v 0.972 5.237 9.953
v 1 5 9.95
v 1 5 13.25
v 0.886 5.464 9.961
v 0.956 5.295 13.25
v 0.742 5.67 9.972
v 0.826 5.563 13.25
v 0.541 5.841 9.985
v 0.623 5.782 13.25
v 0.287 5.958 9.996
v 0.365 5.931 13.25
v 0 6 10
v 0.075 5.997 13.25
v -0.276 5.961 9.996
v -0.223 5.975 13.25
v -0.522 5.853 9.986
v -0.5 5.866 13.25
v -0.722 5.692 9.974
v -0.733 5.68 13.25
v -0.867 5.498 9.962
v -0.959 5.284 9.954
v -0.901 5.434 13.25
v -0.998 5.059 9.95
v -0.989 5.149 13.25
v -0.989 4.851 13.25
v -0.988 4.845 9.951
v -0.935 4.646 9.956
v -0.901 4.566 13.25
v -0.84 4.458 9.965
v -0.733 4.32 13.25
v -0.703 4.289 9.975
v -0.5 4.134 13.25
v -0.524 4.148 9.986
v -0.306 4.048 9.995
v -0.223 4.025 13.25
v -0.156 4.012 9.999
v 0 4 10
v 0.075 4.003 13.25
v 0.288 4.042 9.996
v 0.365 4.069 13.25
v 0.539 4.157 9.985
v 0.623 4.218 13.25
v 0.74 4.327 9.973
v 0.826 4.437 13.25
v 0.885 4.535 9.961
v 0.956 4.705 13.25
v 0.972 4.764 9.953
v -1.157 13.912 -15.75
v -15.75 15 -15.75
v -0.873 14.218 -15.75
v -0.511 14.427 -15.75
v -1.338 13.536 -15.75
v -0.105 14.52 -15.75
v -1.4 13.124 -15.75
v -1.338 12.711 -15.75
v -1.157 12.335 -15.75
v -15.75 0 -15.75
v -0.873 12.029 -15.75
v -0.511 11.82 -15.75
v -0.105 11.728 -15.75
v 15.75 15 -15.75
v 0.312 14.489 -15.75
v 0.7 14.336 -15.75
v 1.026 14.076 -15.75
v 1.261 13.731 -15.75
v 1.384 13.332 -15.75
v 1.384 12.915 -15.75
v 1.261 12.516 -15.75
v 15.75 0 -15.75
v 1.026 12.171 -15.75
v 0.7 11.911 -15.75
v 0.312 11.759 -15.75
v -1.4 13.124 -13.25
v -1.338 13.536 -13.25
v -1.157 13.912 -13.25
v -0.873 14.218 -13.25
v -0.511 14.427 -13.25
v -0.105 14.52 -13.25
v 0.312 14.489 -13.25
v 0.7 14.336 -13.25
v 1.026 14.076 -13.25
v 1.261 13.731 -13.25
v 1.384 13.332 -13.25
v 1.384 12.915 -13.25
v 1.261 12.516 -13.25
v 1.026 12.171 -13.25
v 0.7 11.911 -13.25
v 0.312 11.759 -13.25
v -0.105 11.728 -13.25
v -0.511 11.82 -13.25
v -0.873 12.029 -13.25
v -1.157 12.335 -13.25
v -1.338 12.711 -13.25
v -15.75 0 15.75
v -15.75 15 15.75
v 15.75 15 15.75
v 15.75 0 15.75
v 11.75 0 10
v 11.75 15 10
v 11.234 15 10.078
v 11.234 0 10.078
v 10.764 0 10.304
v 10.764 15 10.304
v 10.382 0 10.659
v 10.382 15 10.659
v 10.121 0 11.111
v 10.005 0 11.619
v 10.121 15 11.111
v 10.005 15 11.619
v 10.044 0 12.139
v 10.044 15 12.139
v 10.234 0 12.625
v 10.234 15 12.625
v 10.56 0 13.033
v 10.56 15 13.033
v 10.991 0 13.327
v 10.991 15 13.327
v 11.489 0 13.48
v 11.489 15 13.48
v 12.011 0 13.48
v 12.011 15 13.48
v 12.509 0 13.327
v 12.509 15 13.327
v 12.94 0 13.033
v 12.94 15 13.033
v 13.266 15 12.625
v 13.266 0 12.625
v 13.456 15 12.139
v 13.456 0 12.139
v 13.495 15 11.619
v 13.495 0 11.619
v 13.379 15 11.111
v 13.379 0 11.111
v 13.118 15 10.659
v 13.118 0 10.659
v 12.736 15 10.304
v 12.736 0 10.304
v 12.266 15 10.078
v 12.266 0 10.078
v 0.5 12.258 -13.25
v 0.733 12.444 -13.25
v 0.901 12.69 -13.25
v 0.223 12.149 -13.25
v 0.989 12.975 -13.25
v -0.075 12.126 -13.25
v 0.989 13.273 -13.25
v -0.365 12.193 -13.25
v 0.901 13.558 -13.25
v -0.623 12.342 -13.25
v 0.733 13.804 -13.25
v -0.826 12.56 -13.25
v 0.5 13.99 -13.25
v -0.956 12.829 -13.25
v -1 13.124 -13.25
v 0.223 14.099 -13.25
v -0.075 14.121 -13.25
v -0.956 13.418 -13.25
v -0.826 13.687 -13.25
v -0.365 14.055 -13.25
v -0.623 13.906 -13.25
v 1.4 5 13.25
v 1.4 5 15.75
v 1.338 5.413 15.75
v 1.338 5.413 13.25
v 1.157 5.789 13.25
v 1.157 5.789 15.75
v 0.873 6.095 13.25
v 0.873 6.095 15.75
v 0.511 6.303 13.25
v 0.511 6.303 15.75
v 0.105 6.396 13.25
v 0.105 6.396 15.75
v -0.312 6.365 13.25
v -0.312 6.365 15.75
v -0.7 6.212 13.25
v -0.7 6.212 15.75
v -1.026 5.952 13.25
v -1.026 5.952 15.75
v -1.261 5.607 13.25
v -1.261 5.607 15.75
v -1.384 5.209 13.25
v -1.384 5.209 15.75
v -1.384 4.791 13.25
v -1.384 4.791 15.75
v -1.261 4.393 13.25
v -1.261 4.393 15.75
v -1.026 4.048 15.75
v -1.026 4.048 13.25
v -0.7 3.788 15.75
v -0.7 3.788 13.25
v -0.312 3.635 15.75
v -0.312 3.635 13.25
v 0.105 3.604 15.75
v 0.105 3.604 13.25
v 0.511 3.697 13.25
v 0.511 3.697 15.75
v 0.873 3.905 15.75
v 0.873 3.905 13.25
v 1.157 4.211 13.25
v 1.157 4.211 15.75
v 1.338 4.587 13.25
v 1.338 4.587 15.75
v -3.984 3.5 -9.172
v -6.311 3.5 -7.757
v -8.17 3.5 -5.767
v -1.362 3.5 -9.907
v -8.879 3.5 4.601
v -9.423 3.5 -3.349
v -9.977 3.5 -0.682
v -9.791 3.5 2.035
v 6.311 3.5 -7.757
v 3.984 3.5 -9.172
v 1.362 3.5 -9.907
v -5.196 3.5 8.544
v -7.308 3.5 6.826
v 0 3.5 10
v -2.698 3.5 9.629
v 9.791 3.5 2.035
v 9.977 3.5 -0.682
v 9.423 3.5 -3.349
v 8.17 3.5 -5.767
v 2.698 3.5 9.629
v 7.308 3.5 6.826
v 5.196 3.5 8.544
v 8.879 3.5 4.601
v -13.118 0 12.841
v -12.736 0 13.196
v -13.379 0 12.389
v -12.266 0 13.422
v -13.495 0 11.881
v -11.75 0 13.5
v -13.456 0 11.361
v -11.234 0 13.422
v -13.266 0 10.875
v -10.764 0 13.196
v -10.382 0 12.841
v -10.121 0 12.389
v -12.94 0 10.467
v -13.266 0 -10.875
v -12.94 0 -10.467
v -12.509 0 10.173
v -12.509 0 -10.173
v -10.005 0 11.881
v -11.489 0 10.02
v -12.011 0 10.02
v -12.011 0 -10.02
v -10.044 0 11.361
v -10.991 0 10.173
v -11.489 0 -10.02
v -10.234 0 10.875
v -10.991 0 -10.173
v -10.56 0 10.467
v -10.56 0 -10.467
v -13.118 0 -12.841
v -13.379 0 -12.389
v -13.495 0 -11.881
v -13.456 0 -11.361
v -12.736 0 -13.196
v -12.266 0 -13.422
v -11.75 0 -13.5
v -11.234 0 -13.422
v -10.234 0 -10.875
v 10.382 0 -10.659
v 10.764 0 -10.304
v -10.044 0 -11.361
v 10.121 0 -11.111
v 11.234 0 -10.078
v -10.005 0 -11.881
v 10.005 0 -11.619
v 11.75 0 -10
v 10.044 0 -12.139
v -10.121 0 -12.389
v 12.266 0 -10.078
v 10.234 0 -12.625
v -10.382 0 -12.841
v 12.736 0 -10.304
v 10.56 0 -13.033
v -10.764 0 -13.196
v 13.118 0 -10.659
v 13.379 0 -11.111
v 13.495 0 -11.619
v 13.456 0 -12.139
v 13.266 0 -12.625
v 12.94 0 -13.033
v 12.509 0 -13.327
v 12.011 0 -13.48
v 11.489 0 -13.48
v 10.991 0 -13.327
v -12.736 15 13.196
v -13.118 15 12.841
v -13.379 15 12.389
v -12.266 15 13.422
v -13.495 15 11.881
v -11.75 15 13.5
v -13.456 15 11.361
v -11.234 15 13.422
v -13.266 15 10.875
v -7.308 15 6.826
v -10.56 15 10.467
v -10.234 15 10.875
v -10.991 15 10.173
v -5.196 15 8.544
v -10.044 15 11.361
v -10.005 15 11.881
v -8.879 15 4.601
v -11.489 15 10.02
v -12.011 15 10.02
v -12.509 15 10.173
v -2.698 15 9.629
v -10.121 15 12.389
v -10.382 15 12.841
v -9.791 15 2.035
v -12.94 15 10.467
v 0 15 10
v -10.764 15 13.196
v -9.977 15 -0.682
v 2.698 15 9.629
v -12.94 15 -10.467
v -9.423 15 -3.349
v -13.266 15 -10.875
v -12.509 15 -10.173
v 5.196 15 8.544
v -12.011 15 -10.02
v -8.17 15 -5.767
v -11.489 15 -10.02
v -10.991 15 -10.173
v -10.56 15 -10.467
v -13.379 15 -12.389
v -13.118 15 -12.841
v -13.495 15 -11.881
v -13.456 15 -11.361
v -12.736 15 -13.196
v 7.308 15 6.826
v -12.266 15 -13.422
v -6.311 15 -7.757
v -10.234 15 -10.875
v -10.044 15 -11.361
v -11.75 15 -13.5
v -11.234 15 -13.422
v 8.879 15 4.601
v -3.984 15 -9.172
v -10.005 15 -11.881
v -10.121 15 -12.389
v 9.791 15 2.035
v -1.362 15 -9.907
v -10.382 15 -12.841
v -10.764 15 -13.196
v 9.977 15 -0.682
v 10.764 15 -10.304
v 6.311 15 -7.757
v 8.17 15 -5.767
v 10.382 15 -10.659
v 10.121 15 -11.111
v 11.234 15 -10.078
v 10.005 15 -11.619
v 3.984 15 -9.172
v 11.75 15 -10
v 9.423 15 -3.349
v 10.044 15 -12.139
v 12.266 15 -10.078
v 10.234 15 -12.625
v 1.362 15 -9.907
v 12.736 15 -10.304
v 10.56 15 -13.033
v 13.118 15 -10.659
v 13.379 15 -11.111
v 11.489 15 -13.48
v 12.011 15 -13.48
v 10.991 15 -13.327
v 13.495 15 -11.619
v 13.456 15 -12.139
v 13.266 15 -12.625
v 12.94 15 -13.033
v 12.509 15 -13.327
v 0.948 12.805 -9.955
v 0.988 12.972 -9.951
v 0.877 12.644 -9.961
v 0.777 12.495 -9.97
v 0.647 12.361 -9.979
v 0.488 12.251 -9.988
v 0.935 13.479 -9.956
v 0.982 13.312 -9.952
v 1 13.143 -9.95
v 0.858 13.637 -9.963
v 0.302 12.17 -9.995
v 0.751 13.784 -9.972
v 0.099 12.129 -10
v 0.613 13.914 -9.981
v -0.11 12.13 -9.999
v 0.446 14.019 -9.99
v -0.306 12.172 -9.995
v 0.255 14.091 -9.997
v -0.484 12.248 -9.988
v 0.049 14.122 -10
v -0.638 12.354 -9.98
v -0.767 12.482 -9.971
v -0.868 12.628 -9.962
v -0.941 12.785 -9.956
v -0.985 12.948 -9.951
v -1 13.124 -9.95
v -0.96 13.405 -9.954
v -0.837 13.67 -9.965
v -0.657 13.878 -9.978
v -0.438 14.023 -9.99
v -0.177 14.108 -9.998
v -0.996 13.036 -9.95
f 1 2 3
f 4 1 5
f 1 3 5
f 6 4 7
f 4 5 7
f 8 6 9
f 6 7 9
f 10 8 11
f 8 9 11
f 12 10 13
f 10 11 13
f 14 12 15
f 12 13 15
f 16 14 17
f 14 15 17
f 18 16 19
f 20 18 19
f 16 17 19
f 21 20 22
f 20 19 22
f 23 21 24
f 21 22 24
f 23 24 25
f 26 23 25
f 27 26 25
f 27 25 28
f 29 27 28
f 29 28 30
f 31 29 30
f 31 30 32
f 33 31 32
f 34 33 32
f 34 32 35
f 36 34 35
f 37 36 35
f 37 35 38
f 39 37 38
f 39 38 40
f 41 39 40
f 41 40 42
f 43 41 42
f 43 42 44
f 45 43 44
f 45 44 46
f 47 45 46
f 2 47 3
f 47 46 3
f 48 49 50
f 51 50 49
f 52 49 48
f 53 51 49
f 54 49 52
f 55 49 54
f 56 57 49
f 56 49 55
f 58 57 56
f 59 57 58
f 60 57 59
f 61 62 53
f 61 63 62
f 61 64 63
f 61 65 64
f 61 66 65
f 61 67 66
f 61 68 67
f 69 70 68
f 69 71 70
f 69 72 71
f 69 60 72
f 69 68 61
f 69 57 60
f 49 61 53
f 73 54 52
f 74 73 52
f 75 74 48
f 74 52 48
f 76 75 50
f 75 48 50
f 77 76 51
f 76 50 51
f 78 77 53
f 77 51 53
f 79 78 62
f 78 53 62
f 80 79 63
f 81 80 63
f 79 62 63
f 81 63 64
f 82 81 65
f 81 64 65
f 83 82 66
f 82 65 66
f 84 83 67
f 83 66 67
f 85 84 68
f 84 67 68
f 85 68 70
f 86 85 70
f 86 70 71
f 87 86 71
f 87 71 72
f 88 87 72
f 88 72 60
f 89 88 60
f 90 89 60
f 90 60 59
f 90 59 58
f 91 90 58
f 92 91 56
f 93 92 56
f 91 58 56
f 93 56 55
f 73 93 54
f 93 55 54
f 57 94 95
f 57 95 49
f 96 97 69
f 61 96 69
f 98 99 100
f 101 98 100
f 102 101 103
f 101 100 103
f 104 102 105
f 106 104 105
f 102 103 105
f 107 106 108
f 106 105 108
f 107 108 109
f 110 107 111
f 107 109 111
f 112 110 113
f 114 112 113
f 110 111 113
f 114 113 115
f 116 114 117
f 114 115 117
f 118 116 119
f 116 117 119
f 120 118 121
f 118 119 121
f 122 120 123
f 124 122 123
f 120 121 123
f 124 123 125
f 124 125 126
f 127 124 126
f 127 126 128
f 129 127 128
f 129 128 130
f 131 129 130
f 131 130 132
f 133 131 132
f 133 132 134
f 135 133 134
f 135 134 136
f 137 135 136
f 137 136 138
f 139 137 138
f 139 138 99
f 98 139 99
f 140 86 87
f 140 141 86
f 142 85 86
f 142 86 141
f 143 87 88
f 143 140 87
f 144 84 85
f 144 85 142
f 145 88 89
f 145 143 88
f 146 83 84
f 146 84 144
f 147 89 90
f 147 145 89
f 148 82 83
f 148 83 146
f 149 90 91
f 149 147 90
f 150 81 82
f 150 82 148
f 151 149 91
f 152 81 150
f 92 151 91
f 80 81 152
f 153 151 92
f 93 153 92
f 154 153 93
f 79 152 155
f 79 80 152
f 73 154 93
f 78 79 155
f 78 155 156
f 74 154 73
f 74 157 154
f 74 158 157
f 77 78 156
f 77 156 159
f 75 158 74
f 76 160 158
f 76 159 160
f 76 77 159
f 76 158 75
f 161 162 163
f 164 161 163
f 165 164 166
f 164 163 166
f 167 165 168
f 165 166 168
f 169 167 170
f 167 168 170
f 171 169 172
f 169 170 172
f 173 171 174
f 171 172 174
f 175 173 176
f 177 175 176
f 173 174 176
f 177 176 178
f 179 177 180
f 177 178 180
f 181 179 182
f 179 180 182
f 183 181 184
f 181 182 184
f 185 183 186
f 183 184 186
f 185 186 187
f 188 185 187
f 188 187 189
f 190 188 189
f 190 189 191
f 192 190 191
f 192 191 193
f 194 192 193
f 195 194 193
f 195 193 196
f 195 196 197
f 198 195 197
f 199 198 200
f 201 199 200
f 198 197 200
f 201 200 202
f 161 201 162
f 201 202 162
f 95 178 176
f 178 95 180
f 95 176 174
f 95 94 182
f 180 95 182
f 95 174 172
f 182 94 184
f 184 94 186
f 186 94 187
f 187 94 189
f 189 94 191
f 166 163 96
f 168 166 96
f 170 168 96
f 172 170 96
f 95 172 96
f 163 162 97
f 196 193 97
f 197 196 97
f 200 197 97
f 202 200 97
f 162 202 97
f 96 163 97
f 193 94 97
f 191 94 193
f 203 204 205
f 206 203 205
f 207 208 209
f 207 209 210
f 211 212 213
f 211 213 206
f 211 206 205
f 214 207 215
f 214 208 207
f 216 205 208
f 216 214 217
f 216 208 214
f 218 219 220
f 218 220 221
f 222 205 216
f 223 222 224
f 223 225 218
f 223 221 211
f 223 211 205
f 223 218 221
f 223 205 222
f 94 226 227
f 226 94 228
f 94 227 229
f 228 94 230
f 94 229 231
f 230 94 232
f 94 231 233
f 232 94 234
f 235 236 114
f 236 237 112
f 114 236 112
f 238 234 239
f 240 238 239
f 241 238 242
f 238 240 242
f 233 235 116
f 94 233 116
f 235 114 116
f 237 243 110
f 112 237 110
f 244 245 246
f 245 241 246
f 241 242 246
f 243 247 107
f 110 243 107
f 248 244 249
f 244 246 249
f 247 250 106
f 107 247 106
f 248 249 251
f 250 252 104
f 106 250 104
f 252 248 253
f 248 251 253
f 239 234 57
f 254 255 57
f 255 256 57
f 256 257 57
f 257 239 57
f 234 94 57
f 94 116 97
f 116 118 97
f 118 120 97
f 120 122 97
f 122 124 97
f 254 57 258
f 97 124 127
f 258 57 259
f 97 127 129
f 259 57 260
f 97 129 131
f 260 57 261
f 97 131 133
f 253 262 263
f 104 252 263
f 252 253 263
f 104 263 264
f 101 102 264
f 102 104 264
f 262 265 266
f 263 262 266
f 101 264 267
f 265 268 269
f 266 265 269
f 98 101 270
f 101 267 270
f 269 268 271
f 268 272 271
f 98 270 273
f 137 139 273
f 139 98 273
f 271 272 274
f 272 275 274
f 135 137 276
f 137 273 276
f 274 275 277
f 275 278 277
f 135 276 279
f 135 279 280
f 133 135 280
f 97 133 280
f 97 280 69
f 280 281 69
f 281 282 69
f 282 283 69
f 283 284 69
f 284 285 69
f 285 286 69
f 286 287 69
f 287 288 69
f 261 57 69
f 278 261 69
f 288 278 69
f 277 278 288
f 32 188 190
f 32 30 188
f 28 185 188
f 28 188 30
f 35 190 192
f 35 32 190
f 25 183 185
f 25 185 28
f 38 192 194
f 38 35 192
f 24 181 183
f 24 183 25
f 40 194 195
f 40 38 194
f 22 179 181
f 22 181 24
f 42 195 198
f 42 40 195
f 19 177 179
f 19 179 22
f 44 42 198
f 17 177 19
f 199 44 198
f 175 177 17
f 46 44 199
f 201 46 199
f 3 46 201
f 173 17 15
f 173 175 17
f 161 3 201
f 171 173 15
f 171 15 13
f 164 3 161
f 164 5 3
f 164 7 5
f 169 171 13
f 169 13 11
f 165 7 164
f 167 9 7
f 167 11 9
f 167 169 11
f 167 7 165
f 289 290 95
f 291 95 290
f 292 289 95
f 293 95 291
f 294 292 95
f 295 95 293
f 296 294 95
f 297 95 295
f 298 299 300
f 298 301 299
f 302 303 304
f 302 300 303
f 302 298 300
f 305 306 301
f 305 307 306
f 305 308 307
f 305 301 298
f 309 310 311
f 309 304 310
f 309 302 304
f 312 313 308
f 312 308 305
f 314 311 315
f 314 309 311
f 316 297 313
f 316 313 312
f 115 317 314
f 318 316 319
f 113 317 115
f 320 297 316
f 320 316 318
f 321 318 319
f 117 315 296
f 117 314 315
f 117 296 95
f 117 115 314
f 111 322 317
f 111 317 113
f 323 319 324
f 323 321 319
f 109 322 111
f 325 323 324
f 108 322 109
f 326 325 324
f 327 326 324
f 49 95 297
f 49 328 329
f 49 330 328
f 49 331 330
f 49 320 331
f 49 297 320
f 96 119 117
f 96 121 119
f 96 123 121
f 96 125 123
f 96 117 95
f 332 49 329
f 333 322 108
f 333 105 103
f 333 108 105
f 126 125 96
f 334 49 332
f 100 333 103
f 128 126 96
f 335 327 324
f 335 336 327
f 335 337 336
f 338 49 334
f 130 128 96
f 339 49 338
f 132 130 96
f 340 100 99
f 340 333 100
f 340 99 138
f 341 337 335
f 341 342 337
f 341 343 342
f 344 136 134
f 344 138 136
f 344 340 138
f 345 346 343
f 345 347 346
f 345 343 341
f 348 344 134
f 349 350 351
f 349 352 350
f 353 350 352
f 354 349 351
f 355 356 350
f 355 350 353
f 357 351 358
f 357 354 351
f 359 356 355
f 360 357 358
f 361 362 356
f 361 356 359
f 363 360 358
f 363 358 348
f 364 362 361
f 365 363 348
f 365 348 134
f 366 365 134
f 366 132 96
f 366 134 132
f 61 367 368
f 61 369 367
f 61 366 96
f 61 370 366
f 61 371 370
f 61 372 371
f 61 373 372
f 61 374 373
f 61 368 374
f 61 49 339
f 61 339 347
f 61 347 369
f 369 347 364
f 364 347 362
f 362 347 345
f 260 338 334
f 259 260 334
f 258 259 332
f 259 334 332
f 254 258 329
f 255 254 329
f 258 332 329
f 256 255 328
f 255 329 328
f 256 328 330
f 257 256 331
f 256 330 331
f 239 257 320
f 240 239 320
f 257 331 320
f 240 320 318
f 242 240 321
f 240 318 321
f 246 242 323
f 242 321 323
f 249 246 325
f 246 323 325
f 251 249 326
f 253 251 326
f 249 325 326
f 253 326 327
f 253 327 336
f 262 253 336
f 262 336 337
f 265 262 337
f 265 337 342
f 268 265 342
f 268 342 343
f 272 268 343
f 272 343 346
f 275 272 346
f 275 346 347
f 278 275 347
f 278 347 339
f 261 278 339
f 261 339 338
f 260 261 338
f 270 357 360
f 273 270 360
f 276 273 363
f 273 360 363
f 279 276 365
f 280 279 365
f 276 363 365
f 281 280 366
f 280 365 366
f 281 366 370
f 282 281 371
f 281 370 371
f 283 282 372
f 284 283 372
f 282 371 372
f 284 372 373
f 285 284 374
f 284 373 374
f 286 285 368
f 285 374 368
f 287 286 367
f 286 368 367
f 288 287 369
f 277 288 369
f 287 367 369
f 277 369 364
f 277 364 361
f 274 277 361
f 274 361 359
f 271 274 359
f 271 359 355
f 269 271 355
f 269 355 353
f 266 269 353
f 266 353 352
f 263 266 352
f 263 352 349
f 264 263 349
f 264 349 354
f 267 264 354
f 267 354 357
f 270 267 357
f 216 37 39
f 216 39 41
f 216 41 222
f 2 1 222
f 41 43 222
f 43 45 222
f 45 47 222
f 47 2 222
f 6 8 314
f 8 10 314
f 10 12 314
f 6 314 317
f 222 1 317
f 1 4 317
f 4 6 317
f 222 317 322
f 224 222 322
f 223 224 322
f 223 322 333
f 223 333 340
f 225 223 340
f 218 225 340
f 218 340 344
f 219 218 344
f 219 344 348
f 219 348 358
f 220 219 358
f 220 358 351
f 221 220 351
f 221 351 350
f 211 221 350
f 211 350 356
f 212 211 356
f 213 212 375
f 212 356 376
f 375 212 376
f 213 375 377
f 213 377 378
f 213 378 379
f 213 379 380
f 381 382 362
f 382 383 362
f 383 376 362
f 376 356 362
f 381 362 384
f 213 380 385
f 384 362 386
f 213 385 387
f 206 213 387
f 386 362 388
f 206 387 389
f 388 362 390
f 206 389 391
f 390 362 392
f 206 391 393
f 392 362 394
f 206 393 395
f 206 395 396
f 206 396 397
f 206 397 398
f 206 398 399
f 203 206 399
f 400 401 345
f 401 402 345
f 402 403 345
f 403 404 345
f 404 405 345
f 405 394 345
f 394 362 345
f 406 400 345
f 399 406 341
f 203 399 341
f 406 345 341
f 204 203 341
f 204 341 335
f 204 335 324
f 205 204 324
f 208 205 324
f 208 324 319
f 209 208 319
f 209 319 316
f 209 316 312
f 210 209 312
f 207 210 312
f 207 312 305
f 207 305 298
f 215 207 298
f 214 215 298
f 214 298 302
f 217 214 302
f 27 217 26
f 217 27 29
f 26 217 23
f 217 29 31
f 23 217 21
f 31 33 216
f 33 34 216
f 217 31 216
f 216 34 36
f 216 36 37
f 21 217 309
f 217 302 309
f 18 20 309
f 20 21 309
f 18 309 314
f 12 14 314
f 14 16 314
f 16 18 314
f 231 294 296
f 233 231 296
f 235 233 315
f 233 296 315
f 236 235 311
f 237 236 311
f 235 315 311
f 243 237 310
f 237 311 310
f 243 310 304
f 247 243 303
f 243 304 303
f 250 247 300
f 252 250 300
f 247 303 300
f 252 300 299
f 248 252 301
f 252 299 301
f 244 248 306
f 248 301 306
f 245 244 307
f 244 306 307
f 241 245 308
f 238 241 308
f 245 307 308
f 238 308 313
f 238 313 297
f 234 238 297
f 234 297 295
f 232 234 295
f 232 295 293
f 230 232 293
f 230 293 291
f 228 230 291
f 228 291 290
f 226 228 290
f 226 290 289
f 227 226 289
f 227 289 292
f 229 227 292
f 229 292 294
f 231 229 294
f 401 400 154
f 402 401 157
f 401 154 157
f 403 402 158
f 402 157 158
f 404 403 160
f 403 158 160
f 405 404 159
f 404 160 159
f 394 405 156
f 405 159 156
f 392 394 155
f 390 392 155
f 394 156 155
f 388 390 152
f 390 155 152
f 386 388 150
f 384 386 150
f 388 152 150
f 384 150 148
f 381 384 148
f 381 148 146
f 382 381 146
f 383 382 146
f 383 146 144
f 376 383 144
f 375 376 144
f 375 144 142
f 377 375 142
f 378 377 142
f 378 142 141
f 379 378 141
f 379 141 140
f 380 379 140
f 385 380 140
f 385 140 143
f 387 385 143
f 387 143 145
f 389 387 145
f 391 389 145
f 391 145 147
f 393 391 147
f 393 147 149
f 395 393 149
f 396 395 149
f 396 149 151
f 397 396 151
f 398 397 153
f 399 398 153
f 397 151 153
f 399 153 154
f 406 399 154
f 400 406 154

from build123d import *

# Parameters (mm, degrees)
CROQUIS1_W                 = 31.5
CROQUIS1_H                 = 31.5
SALIENTE_EXTRUIR1_DEPTH    = 15
CROQUIS3_R                 = 10
CORTAR_EXTRUIR1_DEPTH      = 11.5
CROQUIS6_R                 = 1.75
CORTAR_EXTRUIR2_DEPTH      = 27.853770685
CORTAR_EXTRUIR3_REACH      = 40.279
CORTAR_EXTRUIR3_END_RADIUS = 10
CROQUIS7_R                 = 1
CORTAR_EXTRUIR4_REACH      = 40.279
CORTAR_EXTRUIR4_END_RADIUS = 10
CROQUIS8_R                 = 1
CROQUIS9_R                 = 1.4
CORTAR_EXTRUIR5_DEPTH      = 2.5
CROQUIS10_R                = 1.4
CORTAR_EXTRUIR6_DEPTH      = 2.5


with BuildPart() as part:
    # Croquis1 → Saliente-Extruir1 (new body)
    with BuildSketch(Plane(origin=(0, 0, 0), x_dir=(1, 0, 0), z_dir=(0, 1, 0))):
        Rectangle(CROQUIS1_W, CROQUIS1_H)
    extrude(amount=SALIENTE_EXTRUIR1_DEPTH)

    # Croquis3 → Cortar-Extruir1 (cut)
    with BuildSketch(Plane(origin=(0, 15, 0), x_dir=(1, 0, 0), z_dir=(0, 1, 0))):
        with Locations(Location((0, 0, 0), (0, 0, 270))):
            Circle(CROQUIS3_R)
    extrude(amount=-CORTAR_EXTRUIR1_DEPTH, mode=Mode.SUBTRACT)

    # Croquis6 → Cortar-Extruir2 (cut, through all)
    with BuildSketch(Plane(origin=(0, 15, 0), x_dir=(1, 0, 0), z_dir=(0, 1, 0))):
        with Locations(Location((-11.75, -11.75, 0), (0, 0, 270))):
            Circle(CROQUIS6_R)
        with Locations(Location((11.75, -11.75, 0), (0, 0, 90))):
            Circle(CROQUIS6_R)
        with Locations(Location((11.75, 11.75, 0), (0, 0, 270))):
            Circle(CROQUIS6_R)
        with Locations(Location((-11.75, 11.75, 0), (0, 0, 90))):
            Circle(CROQUIS6_R)
    extrude(amount=-CORTAR_EXTRUIR2_DEPTH, mode=Mode.SUBTRACT)

    # Cortar-Extruir3: up to this cylinder (the profile starts outside it)
    cortar_extruir3_end = Plane(origin=(0, 5, 0), z_dir=(0, 1, 0)) * Cylinder(CORTAR_EXTRUIR3_END_RADIUS, 101.558, mode=Mode.PRIVATE)
    # Croquis7 → Cortar-Extruir3 (cut, up to the surface)
    with BuildSketch(Plane.XY.offset(15.75), mode=Mode.PRIVATE) as cortar_extruir3_sk1:
        with Locations((0, 5)):
            Circle(CROQUIS7_R)
    cortar_extruir3_tool1 = extrude(cortar_extruir3_sk1.sketch, amount=-CORTAR_EXTRUIR3_REACH, mode=Mode.PRIVATE) - cortar_extruir3_end
    add(cortar_extruir3_tool1.solids().sort_by_distance((0, 5, 15.75))[0], mode=Mode.SUBTRACT)

    # Cortar-Extruir4: up to this cylinder (the profile starts outside it)
    cortar_extruir4_end = Plane(origin=(0, 13.123683, 0), z_dir=(0, 1, 0)) * Cylinder(CORTAR_EXTRUIR4_END_RADIUS, 101.558, mode=Mode.PRIVATE)
    # Croquis8 → Cortar-Extruir4 (cut, up to the surface)
    with BuildSketch(Plane(origin=(0, 0, -15.75), x_dir=(-1, 0, 0), z_dir=(0, 0, -1)), mode=Mode.PRIVATE) as cortar_extruir4_sk1:
        with Locations((0, 13.123683267)):
            Circle(CROQUIS8_R)
    cortar_extruir4_tool1 = extrude(cortar_extruir4_sk1.sketch, amount=-CORTAR_EXTRUIR4_REACH, mode=Mode.PRIVATE) - cortar_extruir4_end
    add(cortar_extruir4_tool1.solids().sort_by_distance((0, 13.123683, -15.75))[0], mode=Mode.SUBTRACT)

    # Croquis9 → Cortar-Extruir5 (cut)
    with BuildSketch(Plane.XY.offset(15.75)):
        with Locations((0, 5)):
            Circle(CROQUIS9_R)
    extrude(amount=-CORTAR_EXTRUIR5_DEPTH, mode=Mode.SUBTRACT)

    # Croquis10 → Cortar-Extruir6 (cut)
    with BuildSketch(Plane(origin=(0, 0, -15.75), x_dir=(-1, 0, 0), z_dir=(0, 0, -1))):
        with Locations((0, 13.123683267)):
            Circle(CROQUIS10_R)
    extrude(amount=-CORTAR_EXTRUIR6_DEPTH, mode=Mode.SUBTRACT)


solid = part.part
